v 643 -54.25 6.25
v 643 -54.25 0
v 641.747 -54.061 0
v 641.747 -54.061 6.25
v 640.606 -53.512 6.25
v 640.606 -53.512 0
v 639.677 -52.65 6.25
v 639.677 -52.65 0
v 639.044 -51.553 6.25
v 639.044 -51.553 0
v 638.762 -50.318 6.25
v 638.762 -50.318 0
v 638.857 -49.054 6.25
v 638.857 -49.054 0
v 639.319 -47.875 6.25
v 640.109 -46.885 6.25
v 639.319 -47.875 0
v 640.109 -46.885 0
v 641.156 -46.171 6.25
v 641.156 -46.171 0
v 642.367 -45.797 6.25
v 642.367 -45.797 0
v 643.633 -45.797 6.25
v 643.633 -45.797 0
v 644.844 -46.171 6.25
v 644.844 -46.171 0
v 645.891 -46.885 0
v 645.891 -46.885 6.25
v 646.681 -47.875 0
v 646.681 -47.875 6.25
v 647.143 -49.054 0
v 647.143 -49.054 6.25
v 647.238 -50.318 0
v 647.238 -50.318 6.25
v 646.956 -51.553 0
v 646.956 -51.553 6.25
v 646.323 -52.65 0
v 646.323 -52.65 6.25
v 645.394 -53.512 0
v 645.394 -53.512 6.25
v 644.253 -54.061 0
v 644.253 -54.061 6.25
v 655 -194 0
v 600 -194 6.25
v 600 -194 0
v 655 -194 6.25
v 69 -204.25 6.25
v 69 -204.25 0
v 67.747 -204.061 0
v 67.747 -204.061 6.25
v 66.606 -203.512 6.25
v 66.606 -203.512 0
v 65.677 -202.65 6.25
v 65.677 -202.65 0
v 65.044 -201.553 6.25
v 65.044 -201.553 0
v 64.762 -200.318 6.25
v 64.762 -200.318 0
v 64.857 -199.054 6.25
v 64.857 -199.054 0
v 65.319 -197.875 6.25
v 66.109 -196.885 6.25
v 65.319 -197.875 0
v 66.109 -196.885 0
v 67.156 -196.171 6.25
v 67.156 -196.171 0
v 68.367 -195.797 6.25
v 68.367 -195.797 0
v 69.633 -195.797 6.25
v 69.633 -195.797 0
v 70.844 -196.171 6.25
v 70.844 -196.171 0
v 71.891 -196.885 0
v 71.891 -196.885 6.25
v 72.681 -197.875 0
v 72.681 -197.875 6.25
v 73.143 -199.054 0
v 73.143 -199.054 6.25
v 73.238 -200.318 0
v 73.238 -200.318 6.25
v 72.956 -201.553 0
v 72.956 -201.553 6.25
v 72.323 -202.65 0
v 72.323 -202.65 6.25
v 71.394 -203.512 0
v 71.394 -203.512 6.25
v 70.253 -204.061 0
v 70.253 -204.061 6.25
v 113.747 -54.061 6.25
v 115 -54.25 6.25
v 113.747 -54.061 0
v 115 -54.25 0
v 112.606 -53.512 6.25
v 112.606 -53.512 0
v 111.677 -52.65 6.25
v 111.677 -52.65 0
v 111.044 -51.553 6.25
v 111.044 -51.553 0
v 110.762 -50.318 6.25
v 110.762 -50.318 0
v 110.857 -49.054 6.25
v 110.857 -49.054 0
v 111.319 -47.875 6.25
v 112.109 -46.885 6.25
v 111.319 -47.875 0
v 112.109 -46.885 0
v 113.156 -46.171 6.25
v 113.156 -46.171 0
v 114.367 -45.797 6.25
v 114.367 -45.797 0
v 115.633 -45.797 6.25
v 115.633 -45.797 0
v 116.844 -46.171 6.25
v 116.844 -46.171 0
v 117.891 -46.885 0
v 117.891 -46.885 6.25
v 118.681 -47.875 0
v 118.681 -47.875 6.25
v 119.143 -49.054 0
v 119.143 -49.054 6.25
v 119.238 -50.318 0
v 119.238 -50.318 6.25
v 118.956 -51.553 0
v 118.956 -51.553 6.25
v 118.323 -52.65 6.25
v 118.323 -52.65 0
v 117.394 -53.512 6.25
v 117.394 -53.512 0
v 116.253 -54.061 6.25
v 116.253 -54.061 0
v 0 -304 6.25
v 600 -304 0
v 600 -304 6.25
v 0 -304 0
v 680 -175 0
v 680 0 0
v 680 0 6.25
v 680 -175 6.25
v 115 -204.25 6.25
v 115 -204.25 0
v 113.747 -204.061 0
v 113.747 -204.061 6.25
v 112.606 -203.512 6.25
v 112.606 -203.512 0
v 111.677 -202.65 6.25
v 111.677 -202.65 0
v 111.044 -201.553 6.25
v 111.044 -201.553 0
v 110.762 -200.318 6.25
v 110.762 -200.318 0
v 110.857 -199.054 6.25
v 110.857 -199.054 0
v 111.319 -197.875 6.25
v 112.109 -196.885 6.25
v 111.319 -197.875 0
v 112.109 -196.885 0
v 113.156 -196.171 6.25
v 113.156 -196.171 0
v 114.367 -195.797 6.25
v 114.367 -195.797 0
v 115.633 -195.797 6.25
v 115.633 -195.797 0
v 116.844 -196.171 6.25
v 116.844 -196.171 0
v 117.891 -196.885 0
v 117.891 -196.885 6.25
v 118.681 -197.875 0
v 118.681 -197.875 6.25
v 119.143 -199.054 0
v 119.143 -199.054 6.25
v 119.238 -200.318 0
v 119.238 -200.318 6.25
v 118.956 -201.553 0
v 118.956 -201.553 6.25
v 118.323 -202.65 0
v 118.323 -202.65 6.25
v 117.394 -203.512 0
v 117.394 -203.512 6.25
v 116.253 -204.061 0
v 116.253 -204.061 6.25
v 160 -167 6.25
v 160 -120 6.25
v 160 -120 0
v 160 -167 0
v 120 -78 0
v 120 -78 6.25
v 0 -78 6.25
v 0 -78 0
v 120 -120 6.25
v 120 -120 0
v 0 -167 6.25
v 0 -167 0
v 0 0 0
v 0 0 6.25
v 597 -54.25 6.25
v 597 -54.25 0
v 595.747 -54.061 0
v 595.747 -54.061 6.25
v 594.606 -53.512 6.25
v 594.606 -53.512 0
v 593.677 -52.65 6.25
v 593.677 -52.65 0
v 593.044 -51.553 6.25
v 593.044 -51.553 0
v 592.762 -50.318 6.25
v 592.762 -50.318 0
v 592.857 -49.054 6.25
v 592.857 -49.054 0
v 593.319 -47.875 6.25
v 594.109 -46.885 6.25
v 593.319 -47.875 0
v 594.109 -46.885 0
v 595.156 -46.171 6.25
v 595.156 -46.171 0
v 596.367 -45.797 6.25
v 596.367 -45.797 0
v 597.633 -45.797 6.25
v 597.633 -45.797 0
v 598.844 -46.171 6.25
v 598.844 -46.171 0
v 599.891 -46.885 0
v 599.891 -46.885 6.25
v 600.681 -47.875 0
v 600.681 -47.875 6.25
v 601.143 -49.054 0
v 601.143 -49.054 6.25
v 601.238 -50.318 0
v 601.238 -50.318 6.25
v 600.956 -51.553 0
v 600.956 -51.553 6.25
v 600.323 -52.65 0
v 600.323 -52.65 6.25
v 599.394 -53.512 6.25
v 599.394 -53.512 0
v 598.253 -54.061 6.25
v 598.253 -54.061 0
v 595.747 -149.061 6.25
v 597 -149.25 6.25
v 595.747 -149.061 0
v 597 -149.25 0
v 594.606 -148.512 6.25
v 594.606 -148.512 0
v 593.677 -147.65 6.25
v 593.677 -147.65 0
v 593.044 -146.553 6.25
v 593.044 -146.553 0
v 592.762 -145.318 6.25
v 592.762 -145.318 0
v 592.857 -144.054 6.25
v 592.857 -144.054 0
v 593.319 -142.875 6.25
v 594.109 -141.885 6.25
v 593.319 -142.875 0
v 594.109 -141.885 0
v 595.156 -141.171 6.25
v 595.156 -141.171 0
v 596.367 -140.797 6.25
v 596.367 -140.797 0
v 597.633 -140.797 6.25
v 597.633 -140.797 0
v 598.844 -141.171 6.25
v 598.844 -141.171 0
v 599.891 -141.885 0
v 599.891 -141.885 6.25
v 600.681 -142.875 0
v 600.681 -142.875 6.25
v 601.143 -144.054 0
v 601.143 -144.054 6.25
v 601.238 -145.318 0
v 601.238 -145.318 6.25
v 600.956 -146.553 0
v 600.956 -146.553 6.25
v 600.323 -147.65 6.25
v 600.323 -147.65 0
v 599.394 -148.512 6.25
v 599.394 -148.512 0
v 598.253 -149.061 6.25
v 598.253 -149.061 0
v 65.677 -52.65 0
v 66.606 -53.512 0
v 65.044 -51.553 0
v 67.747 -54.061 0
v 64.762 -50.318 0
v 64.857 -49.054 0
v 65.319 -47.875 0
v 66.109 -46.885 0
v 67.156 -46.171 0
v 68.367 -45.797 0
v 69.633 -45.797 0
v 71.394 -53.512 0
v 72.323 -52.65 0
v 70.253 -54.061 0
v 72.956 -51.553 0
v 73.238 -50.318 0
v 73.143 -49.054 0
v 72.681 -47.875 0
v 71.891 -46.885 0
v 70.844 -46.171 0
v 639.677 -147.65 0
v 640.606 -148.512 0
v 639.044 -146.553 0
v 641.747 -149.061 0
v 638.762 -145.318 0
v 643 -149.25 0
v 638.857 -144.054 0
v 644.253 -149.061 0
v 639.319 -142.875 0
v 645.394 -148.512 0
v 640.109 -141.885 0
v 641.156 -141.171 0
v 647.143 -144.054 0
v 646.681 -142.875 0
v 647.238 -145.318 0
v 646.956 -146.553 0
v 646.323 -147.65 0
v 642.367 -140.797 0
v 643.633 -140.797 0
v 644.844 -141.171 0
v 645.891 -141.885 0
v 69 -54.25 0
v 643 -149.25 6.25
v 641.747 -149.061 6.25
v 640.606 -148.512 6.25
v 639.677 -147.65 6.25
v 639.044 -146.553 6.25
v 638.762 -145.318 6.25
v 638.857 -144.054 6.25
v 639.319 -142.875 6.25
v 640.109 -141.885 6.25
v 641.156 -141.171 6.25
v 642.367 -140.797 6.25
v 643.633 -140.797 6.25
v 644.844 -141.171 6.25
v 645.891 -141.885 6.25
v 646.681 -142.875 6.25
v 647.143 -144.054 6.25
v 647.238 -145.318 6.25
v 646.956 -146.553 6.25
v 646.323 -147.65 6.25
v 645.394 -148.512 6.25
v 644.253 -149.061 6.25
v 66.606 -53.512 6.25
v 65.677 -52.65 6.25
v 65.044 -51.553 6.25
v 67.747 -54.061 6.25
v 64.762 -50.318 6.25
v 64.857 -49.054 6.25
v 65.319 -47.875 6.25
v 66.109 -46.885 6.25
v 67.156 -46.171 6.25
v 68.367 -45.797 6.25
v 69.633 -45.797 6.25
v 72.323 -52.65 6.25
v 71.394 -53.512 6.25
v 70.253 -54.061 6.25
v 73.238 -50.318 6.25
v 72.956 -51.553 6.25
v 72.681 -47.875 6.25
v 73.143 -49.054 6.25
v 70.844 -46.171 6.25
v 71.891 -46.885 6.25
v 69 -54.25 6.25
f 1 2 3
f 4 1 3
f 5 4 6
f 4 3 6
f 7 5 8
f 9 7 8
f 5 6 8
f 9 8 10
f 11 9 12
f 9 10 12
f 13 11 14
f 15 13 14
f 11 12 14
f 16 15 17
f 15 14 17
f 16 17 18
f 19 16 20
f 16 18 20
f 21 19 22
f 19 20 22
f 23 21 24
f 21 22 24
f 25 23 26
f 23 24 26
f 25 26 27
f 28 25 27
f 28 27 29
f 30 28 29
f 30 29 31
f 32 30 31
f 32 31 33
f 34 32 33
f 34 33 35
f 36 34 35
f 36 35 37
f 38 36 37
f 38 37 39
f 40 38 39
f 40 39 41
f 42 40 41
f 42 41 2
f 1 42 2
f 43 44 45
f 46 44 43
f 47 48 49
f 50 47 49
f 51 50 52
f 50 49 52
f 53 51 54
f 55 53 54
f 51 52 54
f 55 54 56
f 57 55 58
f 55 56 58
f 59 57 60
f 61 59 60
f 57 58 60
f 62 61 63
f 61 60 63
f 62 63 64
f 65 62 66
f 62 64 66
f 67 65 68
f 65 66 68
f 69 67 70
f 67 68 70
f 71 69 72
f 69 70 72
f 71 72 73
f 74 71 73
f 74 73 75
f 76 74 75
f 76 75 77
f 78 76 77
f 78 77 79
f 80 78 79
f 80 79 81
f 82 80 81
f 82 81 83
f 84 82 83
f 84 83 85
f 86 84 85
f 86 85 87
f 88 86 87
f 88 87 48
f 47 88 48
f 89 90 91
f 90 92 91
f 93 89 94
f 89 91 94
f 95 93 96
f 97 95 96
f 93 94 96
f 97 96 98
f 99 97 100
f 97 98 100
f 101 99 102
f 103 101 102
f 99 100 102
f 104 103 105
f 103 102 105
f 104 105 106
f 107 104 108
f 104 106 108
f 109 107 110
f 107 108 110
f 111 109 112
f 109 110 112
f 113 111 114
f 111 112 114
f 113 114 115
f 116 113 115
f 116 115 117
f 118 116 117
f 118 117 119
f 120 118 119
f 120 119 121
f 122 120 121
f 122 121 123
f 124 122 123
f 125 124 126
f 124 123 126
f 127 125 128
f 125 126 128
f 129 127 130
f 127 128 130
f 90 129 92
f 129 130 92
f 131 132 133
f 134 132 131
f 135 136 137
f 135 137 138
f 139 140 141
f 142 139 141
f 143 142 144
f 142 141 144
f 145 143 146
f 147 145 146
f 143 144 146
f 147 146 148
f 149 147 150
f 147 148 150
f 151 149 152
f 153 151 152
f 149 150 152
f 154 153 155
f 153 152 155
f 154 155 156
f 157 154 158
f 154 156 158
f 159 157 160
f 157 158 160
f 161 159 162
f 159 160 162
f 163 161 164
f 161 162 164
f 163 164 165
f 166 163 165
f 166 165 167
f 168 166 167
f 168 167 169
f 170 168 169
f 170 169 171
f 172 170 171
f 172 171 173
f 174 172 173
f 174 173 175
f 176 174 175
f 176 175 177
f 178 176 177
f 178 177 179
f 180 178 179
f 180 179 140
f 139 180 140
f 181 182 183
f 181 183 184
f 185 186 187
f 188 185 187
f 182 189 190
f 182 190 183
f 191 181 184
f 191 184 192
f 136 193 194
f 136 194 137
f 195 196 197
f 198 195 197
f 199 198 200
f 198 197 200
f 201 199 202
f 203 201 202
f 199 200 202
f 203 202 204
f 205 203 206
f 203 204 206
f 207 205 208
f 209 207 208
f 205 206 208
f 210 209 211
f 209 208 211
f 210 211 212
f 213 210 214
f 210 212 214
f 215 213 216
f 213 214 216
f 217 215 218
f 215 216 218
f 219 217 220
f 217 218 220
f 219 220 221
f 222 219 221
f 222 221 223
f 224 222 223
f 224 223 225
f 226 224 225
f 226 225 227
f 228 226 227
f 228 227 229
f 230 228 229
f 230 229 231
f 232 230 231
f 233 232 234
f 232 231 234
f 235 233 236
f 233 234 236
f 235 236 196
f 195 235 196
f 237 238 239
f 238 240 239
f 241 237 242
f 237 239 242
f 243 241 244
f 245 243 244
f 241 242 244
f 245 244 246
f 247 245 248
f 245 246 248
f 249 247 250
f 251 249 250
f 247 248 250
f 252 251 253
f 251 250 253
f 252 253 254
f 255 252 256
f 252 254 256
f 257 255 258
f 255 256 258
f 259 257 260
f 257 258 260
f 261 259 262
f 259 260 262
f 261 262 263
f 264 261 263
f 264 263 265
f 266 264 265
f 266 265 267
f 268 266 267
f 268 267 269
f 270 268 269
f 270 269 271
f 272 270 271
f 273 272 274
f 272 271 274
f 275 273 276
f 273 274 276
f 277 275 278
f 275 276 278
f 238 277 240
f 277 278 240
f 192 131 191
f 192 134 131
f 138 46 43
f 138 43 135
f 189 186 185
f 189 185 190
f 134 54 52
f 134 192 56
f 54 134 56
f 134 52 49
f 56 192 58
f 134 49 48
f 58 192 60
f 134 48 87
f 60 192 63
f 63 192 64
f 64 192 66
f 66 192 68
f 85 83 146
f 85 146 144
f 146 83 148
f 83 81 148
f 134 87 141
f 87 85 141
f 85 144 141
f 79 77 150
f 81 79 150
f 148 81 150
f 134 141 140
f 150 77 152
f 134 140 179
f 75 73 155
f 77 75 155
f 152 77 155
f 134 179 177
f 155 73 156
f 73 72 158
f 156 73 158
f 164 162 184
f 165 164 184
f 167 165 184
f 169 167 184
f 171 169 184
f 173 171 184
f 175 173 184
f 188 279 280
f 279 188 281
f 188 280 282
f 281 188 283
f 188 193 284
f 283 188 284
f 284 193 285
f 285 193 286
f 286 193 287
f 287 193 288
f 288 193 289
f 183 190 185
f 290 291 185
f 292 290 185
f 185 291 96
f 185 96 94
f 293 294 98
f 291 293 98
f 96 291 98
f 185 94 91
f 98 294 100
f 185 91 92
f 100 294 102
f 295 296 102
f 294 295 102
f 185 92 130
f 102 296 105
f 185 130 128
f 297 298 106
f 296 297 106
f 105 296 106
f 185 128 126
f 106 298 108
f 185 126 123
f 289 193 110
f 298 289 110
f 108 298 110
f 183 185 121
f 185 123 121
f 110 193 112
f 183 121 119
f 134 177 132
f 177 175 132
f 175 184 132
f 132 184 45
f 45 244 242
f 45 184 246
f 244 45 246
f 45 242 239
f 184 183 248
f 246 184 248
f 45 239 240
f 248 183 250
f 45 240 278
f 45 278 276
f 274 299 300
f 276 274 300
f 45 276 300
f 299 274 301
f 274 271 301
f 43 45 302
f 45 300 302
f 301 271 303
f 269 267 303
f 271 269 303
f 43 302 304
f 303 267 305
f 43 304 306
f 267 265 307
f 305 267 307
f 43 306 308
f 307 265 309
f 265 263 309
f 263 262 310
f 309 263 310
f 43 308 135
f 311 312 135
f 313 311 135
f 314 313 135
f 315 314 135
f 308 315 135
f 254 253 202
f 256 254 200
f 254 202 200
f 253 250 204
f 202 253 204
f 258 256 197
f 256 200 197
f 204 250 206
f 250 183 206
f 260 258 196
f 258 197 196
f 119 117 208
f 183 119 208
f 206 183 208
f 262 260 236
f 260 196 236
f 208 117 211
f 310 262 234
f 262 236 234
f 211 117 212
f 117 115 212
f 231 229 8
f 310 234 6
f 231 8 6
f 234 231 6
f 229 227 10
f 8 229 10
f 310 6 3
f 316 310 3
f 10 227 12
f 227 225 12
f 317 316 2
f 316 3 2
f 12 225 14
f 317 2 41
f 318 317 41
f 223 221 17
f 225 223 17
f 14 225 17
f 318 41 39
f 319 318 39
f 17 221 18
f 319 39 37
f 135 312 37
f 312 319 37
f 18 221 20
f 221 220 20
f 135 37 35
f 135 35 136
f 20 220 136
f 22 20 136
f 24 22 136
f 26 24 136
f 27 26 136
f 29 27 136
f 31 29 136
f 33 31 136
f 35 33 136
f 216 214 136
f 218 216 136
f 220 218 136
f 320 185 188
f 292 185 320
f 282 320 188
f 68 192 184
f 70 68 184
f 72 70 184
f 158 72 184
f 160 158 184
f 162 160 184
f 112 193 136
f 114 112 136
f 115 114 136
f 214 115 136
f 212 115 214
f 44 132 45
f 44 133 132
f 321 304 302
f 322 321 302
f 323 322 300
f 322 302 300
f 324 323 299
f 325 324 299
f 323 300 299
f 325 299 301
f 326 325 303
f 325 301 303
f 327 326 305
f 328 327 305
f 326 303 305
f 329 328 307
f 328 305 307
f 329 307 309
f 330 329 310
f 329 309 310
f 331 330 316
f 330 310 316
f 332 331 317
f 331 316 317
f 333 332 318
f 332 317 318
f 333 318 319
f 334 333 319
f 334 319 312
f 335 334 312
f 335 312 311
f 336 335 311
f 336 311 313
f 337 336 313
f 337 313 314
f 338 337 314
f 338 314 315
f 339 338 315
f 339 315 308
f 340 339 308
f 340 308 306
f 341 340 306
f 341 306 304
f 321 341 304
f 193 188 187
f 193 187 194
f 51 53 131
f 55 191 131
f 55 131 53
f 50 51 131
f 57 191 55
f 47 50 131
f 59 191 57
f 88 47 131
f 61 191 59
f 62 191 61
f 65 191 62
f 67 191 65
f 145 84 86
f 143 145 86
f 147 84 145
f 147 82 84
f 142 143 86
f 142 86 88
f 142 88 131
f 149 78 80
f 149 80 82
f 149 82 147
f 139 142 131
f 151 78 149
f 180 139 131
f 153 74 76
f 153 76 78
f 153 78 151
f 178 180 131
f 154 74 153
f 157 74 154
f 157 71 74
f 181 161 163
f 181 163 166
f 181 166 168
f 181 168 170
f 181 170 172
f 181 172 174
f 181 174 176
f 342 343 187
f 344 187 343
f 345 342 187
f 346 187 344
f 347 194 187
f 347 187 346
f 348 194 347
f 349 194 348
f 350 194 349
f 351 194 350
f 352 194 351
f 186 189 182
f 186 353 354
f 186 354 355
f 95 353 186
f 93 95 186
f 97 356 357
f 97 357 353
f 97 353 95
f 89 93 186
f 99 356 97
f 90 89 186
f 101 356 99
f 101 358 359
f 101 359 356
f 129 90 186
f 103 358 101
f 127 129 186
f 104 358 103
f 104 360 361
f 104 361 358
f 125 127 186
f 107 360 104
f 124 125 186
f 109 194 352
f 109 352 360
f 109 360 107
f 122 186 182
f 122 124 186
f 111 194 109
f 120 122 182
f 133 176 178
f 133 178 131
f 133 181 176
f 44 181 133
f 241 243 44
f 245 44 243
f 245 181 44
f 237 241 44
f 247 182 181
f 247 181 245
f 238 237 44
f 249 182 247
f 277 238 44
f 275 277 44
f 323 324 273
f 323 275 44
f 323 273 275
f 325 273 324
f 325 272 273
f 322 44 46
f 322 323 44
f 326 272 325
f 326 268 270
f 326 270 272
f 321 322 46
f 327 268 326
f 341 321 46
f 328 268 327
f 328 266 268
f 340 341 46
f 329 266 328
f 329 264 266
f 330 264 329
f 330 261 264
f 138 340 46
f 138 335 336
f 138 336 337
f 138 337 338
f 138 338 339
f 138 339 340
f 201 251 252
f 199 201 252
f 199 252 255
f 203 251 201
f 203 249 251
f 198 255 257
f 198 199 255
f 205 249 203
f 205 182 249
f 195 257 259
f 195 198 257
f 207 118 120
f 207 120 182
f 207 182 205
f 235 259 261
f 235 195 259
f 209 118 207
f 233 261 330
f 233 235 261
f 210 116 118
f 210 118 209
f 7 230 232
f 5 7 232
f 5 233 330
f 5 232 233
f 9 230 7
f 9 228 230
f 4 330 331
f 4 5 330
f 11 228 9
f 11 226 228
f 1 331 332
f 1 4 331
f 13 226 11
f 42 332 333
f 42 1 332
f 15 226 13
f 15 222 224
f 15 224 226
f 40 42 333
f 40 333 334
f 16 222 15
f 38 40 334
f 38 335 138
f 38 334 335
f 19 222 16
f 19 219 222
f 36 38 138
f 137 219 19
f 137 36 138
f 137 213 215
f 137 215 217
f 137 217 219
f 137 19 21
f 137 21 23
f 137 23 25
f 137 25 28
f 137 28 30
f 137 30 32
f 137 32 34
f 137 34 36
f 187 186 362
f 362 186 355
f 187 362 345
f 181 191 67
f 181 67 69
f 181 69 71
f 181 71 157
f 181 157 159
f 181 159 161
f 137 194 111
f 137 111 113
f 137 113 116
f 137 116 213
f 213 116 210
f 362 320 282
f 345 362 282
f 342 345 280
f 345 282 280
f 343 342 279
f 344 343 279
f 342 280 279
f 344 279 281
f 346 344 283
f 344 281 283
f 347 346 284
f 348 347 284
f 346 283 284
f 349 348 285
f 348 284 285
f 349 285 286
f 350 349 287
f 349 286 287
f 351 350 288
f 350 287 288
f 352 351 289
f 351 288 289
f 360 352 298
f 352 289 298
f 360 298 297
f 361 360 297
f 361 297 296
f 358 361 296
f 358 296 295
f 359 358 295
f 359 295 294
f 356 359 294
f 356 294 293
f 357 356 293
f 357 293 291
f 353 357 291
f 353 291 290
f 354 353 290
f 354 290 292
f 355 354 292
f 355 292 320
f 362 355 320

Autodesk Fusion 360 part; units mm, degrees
sketch "Sketch1" plane through (0, 0, 0) normal (0, 0, 1) x (1, 0, 0)
  line L0 (0, 0) -> (680, 0)
  line L1 (680, 0) -> (680, -304)
  line L2 (680, -304) -> (0, -304)
  line L3 (0, -304) -> (0, 0)
  dimension "d1" = 680
  dimension "d2" = 304
extrude "Extrude1" add sketch "Sketch1" along normal blind 6.25
sketch "Sketch2" plane through (0, 0, 6.25) normal (0, 0, 1) x (-1, 0, 0)
  line L0 (0, 304) -> (-680, 304)
  line L1 (-680, 304) -> (-680, 0)
  line L2 (-680, 0) -> (0, 0)
  line L3 (0, 0) -> (0, 304)
  line L4 (-160, 120) -> (-160, 167)
  line L5 (-160, 167) -> (0, 167)
  line L6 (0, 167) -> (0, 78)
  line L7 (-120, 78) -> (-120, 120)
  line L8 (-120, 120) -> (-160, 120)
  line L9 (-120, 78) -> (0, 78)
  line L10 (-680, 304) -> (-600, 304)
  line L11 (-600, 304) -> (-600, 194)
  line L12 (-600, 194) -> (-655, 194)
  line L13 (-680, 175) -> (-680, 304)
  line L14 (-655, 194) -> (-680, 175)
  dimension "d10" = 120
  dimension "d11" = 42
  dimension "d12" = 47
  dimension "d13" = 120
  dimension "d14" = 160
  dimension "d15" = 110
  dimension "d19" = 129
  dimension "d20" = 55
  dimension "d21" = 80
extrude "Extrude3" cut sketch "Sketch2" against normal blind 6.25 contours L0 L1 L10 L11 L12 L13 L14 | L3 L4 L5 L6 L7 L8 L9
sketch "Sketch4" plane through (0, 0, 6.25) normal (0, 0, 1) x (-1, 0, 0)
  line L0 (-160, 167) -> (0, 167)
  line L1 (0, 167) -> (0, 304)
  line L2 (0, 304) -> (-600, 304)
  line L3 (-600, 304) -> (-600, 194)
  line L4 (-600, 194) -> (-655, 194)
  line L5 (-655, 194) -> (-680, 175)
  line L6 (-680, 175) -> (-680, 0)
  line L7 (-680, 0) -> (0, 0)
  line L8 (0, 0) -> (0, 78)
  line L9 (0, 78) -> (-120, 78)
  line L10 (-120, 78) -> (-120, 120)
  line L11 (-120, 120) -> (-160, 120)
  line L12 (-160, 120) -> (-160, 167)
  line L13 (-69, 200) -> (-115, 200) construction
  line L14 (-597, 145) -> (-643, 145) construction
  line L15 (-115, 50) -> (-69, 50) construction
  line L16 (-597, 50) -> (-643, 50) construction
  point P0 (-643, 145)
  point P1 (-597, 145)
  point P2 (-115, 200)
  point P3 (-69, 200)
  point P4 (-115, 50)
  point P5 (-69, 50)
  point P6 (-597, 50)
  point P7 (-643, 50)
  dimension "d33" = 46
  dimension "d35" = 150
  dimension "d36" = 50
  dimension "d37" = 95
  dimension "d38" = 115
  dimension "d44" = 83
hole "Hole2" at (597, -145, 6.25) at (643, -145, 6.25) at (115, -200, 6.25) at (69, -200, 6.25) at (115, -50, 6.25) at (69, -50, 6.25) at (643, -50, 6.25) at (597, -50, 6.25) direction (0, 0, -1) diameter 8.5 depth 6.25 tip angle 118
sketch "Sketch5" plane through (0, 0, 6.25) normal (0, 0, 1) x (-1, 0, 0)
  circle A0 centre (-643, 50) radius 4.25
  circle A1 centre (-115, 50) radius 4.25
  circle A2 centre (-115, 200) radius 4.25
  circle A3 centre (-597, 145) radius 4.25
  circle A4 centre (-643, 145) radius 4.25
  circle A5 centre (-69, 200) radius 4.25
  circle A6 centre (-69, 50) radius 4.25
  circle A7 centre (-597, 50) radius 4.25
  line L0 (-160, 167) -> (0, 167)
  line L1 (0, 167) -> (0, 304)
  line L2 (0, 304) -> (-600, 304)
  line L3 (-600, 304) -> (-600, 194)
  line L4 (-600, 194) -> (-655, 194)
  line L5 (-655, 194) -> (-680, 175)
  line L6 (-680, 175) -> (-680, 0)
  line L7 (-680, 0) -> (0, 0)
  line L8 (0, 0) -> (0, 78)
  line L9 (0, 78) -> (-120, 78)
  line L10 (-120, 78) -> (-120, 120)
  line L11 (-120, 120) -> (-160, 120)
  line L12 (-160, 120) -> (-160, 167)
  line L13 (-225, 0) -> (-225, 130) construction
  line L14 (-587, 0) -> (-587, 304) construction
  line L15 (-390, 0) -> (-390, 304) construction
  line L16 (-225, 130) -> (-160, 130) construction
  line L17 (-347.9611, 97.8111) -> (-427.9611, 97.8111) construction
  line L18 (-427.9611, 97.8111) -> (-427.9611, 77.8111) construction
  line L19 (-427.9611, 77.8111) -> (-347.9611, 77.8111) construction
  line L20 (-347.9611, 77.8111) -> (-347.9611, 97.8111) construction
  line L21 (-560, 0) -> (-560, 304) construction
  dimension "d39" = 225
  dimension "d41" = 390
  dimension "d42" = 130
  dimension "d43" = 10
  dimension "d46" = 170
  dimension "d47" = 93
equation "d19 = 304 mm - 175 mm"
